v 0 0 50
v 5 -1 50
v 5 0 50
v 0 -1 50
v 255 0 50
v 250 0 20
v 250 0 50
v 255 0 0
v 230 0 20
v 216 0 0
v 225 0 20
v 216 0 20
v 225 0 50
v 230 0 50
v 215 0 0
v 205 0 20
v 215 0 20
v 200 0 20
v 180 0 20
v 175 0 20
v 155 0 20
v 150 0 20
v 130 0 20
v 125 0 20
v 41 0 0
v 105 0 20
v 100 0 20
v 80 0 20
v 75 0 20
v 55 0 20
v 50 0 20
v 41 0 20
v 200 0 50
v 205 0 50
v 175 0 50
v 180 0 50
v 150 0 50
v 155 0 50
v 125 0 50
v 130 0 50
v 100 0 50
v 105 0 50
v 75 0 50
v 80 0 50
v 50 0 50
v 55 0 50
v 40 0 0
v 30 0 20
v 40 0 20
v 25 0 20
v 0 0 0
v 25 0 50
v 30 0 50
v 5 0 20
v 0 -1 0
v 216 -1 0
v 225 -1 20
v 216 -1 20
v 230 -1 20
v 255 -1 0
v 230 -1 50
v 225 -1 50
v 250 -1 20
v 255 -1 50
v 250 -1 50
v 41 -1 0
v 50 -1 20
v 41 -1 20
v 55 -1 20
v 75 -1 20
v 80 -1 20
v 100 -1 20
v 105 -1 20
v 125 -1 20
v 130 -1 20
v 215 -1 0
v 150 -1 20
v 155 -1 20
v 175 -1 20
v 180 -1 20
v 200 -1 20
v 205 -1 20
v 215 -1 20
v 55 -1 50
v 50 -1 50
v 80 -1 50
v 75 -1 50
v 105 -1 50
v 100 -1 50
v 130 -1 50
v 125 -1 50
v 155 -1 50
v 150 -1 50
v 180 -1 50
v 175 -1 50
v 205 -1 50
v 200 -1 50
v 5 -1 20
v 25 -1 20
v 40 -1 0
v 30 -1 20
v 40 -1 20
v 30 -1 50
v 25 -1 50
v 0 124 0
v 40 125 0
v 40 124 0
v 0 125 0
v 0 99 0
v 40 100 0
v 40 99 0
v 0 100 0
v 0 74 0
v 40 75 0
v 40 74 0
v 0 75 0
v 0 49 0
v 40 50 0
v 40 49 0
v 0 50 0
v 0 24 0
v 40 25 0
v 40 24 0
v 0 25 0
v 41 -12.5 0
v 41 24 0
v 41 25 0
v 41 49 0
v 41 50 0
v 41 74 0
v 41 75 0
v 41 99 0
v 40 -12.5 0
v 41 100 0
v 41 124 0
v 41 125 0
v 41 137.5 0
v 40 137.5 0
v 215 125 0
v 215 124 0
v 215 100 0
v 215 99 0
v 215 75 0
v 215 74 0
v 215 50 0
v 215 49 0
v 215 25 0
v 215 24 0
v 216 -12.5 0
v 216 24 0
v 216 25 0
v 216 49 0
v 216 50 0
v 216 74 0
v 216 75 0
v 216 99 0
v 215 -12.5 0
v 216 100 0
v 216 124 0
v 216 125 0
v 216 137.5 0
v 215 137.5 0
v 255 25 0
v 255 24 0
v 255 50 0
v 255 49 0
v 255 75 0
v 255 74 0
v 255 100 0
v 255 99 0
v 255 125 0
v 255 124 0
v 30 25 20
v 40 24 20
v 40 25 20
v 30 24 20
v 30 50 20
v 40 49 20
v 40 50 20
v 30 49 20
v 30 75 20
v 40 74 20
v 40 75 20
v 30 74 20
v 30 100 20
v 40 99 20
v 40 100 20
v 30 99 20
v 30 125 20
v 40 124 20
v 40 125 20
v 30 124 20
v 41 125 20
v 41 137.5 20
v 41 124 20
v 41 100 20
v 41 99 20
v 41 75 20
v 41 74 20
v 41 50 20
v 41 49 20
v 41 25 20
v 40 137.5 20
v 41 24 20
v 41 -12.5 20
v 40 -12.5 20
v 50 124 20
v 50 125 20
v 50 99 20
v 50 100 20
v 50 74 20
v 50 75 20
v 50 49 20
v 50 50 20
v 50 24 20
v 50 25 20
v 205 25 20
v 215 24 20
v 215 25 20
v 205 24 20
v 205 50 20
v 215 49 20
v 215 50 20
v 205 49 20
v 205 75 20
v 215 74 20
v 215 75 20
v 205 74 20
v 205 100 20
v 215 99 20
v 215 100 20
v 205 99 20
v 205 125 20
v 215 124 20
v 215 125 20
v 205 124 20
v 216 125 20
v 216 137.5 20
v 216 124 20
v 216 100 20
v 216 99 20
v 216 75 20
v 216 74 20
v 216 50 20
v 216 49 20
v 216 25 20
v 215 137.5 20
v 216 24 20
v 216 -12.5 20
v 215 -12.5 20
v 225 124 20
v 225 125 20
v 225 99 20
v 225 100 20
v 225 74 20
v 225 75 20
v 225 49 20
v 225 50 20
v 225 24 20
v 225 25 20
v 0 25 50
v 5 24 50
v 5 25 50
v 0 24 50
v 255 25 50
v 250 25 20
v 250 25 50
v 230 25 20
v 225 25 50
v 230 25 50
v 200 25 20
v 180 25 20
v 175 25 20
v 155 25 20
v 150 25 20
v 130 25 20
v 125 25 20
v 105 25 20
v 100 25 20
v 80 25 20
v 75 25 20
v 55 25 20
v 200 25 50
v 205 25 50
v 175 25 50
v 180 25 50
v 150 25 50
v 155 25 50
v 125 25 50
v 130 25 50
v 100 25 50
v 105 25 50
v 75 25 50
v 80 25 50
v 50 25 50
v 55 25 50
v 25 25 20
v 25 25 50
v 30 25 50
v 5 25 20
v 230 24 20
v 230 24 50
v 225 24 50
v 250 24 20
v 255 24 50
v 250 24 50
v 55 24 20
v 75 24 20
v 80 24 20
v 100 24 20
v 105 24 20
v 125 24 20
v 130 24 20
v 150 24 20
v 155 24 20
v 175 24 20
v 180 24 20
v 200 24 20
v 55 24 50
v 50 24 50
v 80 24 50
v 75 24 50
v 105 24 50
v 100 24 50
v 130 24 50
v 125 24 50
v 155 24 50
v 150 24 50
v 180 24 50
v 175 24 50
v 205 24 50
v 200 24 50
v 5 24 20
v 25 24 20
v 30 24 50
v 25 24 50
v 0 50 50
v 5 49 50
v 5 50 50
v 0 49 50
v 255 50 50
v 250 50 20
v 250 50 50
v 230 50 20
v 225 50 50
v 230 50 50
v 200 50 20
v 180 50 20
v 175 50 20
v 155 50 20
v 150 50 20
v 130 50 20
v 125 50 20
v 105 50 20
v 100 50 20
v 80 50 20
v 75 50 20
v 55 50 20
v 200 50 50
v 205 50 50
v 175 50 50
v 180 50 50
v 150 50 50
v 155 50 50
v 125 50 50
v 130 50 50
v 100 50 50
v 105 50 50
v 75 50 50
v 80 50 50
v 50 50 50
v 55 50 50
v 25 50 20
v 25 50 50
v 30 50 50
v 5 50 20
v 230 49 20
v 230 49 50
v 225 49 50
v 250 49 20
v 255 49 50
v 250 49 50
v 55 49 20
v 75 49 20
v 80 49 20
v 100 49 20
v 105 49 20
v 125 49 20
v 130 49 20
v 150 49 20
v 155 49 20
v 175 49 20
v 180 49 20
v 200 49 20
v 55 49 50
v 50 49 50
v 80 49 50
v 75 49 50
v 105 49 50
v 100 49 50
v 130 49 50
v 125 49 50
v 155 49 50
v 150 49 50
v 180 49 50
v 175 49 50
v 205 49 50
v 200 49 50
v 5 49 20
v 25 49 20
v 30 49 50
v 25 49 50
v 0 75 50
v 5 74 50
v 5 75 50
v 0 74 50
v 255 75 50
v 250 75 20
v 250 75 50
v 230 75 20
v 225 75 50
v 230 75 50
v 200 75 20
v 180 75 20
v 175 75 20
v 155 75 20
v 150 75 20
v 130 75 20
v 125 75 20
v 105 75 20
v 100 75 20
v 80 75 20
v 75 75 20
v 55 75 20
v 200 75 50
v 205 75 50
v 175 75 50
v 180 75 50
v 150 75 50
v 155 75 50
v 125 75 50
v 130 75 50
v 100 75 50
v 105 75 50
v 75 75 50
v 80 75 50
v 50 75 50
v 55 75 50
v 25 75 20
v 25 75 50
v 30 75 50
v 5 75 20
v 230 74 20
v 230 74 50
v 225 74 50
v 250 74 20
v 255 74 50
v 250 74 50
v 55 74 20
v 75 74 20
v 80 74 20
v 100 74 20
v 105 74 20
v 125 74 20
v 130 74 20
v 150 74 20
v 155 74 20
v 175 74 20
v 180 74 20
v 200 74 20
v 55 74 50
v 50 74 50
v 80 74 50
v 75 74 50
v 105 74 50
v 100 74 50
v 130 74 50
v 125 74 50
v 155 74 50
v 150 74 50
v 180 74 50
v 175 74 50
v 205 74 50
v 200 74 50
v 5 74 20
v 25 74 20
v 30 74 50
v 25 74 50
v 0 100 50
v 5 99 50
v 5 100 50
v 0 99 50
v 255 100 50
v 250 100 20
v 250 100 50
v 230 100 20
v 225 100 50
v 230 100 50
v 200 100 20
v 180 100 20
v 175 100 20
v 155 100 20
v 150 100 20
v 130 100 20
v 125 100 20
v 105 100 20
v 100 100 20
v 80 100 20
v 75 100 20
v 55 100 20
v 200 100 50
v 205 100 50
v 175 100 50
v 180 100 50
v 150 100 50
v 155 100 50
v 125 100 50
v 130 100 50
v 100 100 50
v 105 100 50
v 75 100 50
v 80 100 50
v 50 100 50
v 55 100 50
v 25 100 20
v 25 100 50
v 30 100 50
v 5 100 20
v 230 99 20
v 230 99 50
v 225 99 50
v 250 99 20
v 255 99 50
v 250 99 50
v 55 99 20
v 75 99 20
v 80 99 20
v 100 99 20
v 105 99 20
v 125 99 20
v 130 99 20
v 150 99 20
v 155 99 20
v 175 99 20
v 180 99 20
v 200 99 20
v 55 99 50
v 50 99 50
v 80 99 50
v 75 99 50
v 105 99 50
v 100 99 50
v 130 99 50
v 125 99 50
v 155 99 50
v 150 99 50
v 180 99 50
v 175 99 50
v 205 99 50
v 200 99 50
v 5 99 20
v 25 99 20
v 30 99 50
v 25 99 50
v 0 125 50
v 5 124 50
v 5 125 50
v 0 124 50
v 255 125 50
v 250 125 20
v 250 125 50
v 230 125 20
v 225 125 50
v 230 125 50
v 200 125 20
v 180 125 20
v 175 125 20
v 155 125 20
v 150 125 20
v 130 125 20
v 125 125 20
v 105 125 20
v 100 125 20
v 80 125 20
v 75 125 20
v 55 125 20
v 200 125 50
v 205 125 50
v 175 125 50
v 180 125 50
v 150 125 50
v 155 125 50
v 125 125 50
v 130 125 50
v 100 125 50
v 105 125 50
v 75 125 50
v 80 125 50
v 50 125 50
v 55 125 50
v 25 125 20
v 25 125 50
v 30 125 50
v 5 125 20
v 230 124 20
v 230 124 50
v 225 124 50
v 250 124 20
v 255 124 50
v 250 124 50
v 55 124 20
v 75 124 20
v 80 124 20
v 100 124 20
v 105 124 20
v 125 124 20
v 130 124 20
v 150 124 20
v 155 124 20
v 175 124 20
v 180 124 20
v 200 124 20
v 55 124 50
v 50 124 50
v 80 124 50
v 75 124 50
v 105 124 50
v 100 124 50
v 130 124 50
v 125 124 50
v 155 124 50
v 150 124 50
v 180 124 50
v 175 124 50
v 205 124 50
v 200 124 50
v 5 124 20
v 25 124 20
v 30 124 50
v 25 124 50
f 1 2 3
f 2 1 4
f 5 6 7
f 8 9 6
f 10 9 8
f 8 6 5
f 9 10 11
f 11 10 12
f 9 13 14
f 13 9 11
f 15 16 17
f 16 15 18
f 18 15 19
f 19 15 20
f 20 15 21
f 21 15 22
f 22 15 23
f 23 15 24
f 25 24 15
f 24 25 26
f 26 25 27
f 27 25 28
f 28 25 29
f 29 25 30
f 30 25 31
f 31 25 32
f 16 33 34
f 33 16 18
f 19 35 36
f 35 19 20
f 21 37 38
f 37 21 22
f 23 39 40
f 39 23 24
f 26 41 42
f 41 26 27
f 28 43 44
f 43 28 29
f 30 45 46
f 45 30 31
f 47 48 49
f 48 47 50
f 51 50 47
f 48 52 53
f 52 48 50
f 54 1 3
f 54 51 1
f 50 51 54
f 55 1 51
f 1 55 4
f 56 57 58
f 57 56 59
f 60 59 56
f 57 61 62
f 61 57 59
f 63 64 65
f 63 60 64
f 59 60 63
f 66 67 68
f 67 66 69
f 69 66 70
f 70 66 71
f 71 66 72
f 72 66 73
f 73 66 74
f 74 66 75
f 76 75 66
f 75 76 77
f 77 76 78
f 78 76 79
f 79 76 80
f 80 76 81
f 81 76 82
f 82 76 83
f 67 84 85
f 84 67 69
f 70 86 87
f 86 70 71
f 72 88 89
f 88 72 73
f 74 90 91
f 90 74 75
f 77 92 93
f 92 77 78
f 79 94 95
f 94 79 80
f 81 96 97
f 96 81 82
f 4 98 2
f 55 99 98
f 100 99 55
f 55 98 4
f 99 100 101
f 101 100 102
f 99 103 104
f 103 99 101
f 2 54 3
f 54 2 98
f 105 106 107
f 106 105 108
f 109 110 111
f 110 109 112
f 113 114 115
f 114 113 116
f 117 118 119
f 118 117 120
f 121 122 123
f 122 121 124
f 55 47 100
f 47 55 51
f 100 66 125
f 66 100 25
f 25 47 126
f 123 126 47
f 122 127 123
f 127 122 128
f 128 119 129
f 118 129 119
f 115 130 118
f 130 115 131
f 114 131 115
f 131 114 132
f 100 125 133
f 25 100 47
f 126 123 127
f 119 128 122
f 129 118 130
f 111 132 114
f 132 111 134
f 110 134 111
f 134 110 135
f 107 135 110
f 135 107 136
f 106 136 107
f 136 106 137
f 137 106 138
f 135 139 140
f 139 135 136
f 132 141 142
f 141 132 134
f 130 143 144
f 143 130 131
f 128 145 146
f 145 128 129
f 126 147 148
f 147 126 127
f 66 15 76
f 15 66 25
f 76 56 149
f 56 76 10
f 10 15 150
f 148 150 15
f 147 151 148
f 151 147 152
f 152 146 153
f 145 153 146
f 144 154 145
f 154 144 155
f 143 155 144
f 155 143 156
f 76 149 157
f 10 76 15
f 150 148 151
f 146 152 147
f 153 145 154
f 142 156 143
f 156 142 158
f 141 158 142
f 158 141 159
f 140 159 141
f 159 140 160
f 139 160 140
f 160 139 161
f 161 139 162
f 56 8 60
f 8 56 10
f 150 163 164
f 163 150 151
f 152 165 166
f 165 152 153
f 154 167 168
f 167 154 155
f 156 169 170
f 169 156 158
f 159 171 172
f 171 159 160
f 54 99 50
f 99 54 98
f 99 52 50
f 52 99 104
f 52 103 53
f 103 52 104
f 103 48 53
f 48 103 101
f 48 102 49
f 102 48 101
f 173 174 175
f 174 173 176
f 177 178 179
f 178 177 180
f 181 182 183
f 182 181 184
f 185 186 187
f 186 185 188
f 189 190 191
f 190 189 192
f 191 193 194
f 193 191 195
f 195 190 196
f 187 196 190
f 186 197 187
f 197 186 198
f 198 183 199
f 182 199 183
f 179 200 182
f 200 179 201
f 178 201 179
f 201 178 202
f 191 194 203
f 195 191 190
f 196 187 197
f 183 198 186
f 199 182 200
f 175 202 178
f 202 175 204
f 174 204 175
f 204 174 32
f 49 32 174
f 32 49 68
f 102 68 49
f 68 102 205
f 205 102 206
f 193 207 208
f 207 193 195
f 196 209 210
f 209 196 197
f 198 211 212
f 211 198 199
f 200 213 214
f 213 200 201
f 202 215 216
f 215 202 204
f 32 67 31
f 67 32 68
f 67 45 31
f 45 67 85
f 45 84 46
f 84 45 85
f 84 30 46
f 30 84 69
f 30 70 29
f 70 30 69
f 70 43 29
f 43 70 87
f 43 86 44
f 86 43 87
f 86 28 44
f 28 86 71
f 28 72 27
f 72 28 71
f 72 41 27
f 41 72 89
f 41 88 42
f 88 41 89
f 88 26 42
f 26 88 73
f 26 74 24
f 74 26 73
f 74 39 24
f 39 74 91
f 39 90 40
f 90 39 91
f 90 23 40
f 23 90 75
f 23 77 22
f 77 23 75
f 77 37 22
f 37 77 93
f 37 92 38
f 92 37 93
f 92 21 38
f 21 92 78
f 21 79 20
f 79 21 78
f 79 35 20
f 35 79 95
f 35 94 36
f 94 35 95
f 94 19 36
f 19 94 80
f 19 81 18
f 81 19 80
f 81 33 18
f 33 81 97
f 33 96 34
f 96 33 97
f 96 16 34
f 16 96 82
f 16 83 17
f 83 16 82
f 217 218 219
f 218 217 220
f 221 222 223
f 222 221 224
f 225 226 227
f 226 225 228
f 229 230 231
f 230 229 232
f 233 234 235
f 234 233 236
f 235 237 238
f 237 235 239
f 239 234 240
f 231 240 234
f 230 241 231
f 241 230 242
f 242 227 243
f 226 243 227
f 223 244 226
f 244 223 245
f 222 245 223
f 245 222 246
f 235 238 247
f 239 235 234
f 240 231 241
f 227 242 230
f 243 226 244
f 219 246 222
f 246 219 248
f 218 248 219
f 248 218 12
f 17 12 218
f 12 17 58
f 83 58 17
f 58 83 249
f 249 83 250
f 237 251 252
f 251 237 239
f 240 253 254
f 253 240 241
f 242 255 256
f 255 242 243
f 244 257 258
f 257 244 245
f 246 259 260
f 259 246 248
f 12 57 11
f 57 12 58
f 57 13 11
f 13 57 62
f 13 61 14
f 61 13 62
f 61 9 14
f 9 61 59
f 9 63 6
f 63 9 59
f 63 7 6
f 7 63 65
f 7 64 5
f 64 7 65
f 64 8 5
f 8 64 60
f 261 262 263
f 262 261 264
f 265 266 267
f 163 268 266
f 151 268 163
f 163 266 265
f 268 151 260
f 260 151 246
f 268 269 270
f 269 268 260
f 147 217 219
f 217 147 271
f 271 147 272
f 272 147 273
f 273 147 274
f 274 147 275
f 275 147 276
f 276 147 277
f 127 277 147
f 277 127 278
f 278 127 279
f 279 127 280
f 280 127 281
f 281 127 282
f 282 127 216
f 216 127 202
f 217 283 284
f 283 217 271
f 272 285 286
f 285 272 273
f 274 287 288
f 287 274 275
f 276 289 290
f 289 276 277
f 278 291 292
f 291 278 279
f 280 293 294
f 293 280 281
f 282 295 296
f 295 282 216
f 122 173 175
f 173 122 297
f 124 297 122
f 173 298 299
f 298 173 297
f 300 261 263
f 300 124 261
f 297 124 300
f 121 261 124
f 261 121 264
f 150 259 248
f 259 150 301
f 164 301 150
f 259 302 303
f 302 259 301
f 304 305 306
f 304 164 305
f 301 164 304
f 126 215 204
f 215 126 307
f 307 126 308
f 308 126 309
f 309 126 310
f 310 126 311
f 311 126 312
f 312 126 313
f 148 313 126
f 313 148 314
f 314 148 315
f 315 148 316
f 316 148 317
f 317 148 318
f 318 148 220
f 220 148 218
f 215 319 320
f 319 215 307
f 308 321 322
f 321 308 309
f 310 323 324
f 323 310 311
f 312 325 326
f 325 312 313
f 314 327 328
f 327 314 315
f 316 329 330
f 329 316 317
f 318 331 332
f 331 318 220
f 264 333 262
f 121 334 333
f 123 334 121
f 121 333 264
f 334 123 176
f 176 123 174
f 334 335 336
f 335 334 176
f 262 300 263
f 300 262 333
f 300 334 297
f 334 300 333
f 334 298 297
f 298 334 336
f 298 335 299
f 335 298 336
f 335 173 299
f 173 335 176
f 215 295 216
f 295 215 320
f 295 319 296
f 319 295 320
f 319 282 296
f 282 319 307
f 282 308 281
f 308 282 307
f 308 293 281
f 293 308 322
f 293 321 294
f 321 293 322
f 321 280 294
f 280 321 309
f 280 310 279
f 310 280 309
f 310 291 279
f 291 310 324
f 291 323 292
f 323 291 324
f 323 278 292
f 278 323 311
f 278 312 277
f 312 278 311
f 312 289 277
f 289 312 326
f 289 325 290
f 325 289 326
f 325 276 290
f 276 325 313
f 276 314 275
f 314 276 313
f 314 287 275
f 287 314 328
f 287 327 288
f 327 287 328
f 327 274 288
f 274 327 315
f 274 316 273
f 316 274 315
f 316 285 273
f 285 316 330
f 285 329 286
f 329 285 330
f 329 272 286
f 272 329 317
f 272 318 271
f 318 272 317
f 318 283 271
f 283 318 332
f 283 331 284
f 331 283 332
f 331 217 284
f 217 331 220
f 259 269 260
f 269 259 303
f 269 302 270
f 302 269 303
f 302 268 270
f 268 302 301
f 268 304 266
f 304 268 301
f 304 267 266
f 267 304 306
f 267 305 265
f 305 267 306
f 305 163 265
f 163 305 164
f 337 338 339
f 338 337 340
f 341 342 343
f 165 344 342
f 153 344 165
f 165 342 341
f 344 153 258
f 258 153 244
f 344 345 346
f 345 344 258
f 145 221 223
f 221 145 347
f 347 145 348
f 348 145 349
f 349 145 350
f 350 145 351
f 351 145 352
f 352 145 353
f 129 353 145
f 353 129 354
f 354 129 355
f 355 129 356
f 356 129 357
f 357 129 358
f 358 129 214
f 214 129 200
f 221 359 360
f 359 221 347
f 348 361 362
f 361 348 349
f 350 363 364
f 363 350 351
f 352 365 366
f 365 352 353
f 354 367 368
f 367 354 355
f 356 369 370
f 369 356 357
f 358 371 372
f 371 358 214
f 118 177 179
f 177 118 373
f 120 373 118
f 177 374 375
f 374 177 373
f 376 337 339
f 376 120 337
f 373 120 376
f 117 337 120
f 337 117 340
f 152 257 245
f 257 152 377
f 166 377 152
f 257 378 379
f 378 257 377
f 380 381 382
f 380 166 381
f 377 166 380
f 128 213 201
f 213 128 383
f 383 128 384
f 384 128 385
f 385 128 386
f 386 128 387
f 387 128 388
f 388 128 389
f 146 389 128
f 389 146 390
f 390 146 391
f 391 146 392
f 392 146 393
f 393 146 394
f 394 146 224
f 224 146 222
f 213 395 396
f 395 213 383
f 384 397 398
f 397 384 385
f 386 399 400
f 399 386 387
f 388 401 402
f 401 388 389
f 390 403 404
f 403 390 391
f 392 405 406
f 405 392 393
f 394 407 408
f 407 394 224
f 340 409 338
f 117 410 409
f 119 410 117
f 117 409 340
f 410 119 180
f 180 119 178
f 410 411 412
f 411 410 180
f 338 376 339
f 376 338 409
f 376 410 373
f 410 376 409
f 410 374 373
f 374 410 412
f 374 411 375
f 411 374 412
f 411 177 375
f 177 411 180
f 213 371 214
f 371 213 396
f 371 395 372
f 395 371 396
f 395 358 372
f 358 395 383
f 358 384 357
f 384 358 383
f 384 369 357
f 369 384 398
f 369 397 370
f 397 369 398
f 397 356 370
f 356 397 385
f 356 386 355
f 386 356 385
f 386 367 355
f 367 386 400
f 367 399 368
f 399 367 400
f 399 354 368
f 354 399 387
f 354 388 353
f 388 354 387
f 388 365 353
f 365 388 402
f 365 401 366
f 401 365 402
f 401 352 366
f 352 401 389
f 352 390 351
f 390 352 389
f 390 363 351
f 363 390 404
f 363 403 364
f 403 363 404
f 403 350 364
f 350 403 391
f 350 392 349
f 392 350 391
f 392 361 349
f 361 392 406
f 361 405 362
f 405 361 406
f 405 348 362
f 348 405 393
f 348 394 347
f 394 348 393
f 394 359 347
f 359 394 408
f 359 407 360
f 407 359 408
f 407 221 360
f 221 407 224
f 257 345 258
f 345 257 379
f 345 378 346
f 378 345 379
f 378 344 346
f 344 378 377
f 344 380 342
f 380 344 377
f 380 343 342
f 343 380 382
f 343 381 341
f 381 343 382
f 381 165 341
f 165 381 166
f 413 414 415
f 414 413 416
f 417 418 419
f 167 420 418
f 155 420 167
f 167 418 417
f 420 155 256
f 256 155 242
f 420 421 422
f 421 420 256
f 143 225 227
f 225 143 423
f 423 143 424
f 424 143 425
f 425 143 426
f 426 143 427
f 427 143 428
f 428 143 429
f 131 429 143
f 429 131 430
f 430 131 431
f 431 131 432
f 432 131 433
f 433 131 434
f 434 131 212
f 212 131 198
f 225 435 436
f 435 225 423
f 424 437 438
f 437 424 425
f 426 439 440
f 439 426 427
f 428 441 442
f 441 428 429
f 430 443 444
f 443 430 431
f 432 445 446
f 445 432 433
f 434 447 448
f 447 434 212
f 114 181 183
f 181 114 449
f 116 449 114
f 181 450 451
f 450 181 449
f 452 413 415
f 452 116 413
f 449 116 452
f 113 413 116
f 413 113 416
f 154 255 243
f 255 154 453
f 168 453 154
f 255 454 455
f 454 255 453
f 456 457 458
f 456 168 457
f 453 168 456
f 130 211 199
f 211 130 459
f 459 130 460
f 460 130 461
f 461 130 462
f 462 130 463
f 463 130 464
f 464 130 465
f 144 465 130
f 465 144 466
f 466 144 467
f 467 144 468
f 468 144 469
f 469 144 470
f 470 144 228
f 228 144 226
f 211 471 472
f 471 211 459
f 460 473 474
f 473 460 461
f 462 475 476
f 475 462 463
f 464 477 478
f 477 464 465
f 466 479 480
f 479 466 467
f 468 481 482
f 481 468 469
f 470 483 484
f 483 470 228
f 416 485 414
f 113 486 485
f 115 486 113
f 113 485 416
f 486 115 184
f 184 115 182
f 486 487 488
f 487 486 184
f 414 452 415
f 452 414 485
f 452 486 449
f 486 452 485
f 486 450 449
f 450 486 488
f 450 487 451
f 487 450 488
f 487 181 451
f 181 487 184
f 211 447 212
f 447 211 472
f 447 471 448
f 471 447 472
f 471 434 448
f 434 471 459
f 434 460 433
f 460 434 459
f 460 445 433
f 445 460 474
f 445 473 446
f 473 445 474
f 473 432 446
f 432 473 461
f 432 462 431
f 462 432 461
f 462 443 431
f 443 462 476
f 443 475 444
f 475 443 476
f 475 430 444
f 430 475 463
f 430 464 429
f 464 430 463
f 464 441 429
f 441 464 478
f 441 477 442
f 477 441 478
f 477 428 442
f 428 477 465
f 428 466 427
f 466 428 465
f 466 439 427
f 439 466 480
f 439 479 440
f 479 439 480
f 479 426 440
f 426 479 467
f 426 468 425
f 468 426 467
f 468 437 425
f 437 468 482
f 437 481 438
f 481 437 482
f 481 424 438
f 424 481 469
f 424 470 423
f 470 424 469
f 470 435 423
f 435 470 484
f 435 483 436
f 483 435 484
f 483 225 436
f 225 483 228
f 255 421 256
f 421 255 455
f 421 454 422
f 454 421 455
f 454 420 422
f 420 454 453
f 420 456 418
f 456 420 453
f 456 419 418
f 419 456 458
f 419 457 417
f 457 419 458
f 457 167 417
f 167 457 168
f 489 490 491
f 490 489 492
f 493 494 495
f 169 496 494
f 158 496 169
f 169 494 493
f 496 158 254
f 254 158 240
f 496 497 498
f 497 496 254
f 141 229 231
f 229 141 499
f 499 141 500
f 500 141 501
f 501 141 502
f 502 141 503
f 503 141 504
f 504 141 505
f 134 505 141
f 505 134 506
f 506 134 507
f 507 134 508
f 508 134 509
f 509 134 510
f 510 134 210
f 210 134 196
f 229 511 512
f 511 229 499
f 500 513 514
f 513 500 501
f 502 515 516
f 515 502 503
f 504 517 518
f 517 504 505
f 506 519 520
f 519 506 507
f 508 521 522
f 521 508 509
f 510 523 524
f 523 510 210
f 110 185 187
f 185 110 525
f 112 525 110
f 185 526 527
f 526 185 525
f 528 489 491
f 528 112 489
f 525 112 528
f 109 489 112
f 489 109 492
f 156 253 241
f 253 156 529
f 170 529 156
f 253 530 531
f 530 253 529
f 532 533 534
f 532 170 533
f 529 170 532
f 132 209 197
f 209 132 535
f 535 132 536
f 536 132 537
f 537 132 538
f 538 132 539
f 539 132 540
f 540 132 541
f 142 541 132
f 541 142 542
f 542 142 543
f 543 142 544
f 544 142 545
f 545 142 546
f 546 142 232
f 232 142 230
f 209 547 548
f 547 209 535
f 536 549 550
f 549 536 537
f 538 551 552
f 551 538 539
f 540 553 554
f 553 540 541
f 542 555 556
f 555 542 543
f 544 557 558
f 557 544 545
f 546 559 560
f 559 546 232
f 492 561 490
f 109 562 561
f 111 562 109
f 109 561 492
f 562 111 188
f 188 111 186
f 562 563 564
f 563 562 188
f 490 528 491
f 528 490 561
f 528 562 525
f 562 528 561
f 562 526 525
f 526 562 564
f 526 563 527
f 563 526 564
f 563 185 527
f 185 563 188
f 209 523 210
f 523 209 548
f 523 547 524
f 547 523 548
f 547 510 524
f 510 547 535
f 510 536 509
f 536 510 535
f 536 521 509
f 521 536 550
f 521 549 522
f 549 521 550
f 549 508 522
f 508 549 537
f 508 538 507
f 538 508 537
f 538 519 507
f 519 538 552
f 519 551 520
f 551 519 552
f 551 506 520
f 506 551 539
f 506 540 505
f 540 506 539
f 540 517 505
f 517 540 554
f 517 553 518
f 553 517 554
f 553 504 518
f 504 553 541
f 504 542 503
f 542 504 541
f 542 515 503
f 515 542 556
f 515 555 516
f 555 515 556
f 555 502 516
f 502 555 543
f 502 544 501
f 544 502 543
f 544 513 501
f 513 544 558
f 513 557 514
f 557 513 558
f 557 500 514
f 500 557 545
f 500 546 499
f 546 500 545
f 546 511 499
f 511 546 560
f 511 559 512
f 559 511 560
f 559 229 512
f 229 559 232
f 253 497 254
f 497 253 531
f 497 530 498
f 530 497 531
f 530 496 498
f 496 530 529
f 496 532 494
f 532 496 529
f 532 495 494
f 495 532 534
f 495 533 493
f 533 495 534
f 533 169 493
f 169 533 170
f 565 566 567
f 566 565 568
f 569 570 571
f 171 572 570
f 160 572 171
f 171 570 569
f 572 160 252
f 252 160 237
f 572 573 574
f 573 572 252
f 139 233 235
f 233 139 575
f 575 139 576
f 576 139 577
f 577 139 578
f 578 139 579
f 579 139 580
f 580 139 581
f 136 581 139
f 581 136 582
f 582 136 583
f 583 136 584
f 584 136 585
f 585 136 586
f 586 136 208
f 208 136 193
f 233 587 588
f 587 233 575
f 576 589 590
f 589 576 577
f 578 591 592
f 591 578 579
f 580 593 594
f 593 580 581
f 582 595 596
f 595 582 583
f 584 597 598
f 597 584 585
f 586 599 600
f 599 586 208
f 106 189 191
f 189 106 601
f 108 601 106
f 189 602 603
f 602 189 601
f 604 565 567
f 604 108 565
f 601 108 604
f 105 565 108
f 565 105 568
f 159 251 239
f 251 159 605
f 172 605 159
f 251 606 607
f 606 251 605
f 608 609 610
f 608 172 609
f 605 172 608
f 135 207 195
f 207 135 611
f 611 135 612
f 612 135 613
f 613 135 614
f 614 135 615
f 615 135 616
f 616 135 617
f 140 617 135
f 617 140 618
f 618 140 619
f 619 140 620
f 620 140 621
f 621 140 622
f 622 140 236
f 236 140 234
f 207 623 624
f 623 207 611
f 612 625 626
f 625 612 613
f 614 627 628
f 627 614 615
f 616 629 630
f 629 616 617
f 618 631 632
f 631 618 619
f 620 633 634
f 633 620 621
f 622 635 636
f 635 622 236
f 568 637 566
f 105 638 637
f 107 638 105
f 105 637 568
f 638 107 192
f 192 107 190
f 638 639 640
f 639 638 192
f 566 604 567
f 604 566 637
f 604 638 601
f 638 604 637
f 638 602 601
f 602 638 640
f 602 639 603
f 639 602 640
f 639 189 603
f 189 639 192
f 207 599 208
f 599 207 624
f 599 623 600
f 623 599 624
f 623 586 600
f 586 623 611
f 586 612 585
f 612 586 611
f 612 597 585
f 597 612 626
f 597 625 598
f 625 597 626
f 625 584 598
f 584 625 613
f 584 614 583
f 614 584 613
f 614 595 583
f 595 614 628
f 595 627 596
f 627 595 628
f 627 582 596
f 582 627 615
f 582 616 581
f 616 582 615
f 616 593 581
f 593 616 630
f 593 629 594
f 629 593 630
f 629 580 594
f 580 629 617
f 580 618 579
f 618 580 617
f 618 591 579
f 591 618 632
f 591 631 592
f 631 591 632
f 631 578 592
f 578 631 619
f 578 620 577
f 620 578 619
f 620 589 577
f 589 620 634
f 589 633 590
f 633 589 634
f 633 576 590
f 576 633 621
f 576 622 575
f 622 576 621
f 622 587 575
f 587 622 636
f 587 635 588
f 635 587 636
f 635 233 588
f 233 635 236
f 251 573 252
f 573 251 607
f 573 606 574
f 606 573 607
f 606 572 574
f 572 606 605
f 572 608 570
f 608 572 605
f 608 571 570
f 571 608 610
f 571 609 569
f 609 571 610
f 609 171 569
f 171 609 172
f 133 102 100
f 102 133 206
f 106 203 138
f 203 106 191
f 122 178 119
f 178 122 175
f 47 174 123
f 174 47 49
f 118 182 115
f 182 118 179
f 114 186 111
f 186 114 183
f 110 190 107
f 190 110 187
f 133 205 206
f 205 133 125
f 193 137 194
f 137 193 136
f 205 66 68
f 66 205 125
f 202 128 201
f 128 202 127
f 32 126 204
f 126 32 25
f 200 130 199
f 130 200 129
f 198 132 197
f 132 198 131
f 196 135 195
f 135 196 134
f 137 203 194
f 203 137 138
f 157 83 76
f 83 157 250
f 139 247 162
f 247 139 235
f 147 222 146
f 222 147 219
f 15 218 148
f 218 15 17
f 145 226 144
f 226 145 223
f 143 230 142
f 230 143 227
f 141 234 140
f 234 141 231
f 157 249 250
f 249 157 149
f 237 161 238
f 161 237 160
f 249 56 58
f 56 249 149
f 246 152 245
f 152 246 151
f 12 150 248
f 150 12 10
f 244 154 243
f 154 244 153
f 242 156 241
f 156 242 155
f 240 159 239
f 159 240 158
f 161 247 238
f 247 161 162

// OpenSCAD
rack_width = 5;
rack_length = 10;
thickness = 1;

base_height = 20;
base_gap = 20;
rod_height = 30 + base_height;
rod_width = 5;
row_space = base_gap + rod_width;


for (w = [0:rack_width]) {
	translate([0, w * row_space, 0]) {
		for(i = [0:rack_length-1]) {
			translate([i * row_space, 0,0]) rod();
			translate([i * row_space, 0,0]) gap();
		}
		translate([rack_length * (rod_width + base_gap), 0,0]) rod();
	}
}

translate([base_gap*2, -row_space/2, 0]) support();
translate([rack_length * row_space - base_gap*2 + rod_width, -row_space/2, 0]) support();




module rod() {
	rotate([90,0,0]) linear_extrude(thickness) square([rod_width, rod_height]);
}


module gap() {
	rotate([90,0,0]) translate([rod_width,0,0]) linear_extrude(thickness) square([base_gap, base_height]);	
}

module support() {
	rotate([90,0,90])
	linear_extrude(thickness)
	square([(rack_width+1)*row_space, base_height]);
}
	
